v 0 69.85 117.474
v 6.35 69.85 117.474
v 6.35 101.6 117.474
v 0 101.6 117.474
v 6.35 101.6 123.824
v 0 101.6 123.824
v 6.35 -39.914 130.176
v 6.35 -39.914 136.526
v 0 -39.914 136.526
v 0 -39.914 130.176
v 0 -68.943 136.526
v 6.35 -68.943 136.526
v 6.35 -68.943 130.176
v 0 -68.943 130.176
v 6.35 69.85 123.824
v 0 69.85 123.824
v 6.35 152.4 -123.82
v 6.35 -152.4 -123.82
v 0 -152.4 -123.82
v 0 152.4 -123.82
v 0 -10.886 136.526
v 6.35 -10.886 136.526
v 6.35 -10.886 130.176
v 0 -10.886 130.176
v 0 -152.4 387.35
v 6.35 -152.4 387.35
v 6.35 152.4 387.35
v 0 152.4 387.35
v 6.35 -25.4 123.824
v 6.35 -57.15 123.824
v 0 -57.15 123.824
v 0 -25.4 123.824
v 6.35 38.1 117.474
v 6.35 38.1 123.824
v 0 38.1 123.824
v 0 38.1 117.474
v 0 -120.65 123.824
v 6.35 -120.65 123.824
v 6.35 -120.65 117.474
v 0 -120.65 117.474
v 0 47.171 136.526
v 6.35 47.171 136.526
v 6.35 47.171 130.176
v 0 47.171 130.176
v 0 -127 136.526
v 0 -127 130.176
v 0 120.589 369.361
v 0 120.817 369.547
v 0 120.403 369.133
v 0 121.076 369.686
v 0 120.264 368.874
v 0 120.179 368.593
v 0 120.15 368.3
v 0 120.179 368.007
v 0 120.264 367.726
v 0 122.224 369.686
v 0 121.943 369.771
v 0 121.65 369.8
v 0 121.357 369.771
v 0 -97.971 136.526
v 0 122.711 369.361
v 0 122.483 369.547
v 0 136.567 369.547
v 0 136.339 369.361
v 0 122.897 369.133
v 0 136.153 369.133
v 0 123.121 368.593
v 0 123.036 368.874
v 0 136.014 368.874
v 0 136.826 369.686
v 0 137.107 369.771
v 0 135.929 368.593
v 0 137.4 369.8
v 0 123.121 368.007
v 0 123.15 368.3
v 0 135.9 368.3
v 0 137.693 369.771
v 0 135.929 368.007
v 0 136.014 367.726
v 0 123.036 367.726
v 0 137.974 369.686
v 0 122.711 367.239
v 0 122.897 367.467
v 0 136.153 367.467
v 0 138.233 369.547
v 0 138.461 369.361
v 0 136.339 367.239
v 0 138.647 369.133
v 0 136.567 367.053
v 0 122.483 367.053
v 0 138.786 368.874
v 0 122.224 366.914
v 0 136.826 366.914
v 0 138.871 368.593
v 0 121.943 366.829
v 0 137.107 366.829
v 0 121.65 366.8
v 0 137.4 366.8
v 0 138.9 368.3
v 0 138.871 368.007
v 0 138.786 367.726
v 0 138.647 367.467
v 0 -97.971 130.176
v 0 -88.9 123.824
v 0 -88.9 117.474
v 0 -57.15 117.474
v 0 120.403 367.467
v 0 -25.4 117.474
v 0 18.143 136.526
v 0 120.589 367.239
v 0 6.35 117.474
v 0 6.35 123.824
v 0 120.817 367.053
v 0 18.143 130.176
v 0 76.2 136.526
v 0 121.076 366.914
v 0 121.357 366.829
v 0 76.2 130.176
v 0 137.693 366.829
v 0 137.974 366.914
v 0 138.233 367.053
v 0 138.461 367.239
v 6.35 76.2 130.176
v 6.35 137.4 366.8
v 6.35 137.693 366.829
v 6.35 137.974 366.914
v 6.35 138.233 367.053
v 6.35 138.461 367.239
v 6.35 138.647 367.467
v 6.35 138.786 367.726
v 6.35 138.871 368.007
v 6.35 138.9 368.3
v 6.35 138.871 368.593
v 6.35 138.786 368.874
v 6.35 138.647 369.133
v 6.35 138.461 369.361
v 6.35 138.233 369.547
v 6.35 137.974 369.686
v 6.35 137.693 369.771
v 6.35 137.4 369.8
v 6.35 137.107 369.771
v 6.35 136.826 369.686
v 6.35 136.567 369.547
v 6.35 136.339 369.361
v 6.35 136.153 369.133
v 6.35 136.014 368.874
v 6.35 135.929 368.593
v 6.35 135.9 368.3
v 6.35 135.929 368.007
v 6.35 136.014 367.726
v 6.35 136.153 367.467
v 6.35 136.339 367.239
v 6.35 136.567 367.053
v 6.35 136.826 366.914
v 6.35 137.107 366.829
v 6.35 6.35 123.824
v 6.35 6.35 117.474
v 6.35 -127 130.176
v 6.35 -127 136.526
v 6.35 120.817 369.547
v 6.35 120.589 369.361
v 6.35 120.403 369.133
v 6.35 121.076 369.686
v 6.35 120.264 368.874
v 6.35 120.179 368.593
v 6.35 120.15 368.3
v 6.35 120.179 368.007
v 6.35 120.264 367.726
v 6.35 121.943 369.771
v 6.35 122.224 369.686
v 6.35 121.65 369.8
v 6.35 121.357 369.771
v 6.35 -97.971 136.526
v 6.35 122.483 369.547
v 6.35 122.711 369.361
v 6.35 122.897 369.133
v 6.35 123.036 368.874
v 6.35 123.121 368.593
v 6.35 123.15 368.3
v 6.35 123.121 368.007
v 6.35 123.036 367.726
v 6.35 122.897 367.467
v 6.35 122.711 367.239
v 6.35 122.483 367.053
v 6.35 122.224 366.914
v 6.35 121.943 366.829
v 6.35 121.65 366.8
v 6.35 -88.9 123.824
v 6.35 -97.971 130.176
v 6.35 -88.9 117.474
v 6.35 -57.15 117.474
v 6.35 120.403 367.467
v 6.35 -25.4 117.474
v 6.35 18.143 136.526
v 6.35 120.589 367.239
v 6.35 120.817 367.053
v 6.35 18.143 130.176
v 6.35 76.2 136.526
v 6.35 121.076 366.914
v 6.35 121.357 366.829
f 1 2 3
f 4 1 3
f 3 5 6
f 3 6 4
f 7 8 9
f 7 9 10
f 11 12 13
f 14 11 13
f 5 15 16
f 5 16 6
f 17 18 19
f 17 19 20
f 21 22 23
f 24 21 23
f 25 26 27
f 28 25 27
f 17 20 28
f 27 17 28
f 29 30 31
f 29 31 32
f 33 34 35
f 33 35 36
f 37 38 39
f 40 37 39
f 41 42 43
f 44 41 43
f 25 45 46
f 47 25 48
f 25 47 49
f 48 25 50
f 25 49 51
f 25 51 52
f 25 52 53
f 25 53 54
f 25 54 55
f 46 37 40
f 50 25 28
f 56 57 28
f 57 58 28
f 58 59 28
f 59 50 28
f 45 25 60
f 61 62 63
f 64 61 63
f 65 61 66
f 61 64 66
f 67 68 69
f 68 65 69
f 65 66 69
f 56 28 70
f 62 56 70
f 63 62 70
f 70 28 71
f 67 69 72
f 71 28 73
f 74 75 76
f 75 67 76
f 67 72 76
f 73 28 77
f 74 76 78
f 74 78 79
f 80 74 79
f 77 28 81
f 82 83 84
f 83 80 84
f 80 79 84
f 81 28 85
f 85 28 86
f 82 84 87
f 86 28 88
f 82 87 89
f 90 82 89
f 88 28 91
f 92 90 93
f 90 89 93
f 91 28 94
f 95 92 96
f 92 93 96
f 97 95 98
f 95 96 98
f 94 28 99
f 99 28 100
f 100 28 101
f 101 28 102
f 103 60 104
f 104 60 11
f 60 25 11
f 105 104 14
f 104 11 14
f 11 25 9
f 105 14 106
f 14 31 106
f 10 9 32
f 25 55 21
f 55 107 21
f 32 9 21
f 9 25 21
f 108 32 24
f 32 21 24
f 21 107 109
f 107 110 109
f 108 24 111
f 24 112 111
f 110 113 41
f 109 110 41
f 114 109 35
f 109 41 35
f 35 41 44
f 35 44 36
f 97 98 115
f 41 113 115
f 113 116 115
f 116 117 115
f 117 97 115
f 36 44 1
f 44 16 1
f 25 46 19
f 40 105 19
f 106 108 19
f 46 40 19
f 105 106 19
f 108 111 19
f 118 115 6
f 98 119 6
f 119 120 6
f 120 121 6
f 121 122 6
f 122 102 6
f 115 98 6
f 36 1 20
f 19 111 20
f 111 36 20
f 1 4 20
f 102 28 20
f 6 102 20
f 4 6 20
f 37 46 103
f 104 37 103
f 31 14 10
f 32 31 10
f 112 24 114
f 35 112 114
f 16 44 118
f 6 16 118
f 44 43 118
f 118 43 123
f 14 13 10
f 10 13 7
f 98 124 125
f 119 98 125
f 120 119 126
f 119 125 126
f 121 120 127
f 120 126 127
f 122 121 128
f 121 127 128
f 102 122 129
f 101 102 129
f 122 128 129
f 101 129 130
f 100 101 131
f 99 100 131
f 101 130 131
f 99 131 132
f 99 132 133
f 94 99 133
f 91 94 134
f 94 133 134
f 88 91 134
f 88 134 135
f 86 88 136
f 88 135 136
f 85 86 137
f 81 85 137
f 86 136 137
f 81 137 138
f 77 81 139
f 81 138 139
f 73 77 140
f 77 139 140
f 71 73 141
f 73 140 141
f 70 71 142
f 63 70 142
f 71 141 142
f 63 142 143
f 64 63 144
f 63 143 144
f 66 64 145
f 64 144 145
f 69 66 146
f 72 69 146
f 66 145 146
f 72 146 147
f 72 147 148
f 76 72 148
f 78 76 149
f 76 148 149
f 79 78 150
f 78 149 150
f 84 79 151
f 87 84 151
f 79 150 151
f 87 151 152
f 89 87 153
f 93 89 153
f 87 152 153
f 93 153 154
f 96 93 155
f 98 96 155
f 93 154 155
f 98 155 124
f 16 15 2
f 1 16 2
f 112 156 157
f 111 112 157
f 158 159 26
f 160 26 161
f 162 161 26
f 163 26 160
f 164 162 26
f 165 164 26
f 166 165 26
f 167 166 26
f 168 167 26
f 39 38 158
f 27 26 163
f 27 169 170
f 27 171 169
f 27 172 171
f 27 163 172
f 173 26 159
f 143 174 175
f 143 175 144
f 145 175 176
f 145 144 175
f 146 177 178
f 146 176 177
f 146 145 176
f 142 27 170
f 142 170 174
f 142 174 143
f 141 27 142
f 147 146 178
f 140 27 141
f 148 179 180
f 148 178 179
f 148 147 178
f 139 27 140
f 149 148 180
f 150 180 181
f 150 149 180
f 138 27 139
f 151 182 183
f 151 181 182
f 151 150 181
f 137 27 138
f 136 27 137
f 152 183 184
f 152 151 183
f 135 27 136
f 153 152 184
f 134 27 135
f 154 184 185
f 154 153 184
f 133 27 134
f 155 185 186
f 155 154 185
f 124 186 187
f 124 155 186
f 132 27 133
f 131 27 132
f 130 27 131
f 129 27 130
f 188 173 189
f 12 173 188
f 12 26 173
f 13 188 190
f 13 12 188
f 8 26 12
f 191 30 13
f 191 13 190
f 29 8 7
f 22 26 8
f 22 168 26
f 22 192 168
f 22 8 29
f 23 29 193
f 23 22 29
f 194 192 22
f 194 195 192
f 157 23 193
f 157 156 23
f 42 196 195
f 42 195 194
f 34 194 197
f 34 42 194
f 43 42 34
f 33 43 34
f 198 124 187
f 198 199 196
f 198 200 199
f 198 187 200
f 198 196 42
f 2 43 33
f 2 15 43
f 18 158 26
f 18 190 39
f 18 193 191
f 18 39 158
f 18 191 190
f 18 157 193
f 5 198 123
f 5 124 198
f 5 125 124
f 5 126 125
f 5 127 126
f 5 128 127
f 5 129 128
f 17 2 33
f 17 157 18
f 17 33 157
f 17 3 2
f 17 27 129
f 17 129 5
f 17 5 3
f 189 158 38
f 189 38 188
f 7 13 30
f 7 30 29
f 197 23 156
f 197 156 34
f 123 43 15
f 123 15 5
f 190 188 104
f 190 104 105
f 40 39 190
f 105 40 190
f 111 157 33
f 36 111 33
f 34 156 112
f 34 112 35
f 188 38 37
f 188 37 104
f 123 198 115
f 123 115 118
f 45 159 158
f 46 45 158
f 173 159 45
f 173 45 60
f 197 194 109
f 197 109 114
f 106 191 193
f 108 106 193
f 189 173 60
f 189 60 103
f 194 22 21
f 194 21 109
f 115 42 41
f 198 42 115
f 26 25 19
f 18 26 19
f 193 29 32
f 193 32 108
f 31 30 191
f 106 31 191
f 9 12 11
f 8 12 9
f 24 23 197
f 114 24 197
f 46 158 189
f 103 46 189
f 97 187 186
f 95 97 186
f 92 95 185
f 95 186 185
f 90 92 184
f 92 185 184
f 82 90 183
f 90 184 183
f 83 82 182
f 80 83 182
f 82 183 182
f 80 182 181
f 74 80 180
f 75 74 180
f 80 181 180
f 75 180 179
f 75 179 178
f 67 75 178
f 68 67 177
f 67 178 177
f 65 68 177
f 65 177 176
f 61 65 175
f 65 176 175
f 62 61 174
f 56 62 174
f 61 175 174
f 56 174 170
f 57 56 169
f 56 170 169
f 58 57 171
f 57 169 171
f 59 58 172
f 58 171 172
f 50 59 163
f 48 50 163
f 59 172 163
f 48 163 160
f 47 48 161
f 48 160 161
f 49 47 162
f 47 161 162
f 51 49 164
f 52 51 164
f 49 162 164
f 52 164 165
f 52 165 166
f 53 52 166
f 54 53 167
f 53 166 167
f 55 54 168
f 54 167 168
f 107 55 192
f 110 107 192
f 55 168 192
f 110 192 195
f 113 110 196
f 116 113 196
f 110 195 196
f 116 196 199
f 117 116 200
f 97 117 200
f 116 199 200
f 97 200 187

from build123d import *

# Parameters (mm, degrees)
BOSS_EXTRUDE1_DEPTH = 6.35
SKETCH3_W           = 6.35
SKETCH3_H           = 29.028571429
SKETCH3_H_2         = 31.75
CUT_EXTRUDE1_DEPTH  = 419.66682159
SKETCH4_R           = 1.5
CUT_EXTRUDE2_DEPTH  = 6.35
SKETCH5_W           = 6.35
SKETCH5_H           = 44.45
SKETCH5_W_2         = 59.592307692
SKETCH5_H_2         = 6.35
CUT_EXTRUDE3_DEPTH  = 6.35
SKETCH6_W           = 6.35
SKETCH6_H           = 222.25
BOSS_EXTRUDE2_DEPTH = 6.35
SKETCH7_W           = 774.7
SKETCH7_H           = 14.696452311
CUT_EXTRUDE4_DEPTH  = 6.35
SKETCH8_W           = 263.53
SKETCH8_H           = 304.8
CUT_EXTRUDE5_DEPTH  = 417.300498438


with BuildPart() as part:
    # Sketch1 → Boss-Extrude1 (new body)
    with BuildSketch(Plane(origin=(0, 0, 0), x_dir=(0, 0, -1), z_dir=(1, 0, 0))):
        Polygon((381, 152.4), (-387.35, 152.4), (-387.35, 107.95), (-381, 107.95), (-381, 63.5), (-387.35, 63.5), (-387.35, 19.05), (-381, 19.05), (-381, -25.4), (-387.35, -25.4), (-387.35, -69.85), (-381, -69.85), (-381, -114.3), (-387.35, -114.3), (-387.35, -152.4), (-327.757692308, -152.4), (-327.757692308, -158.75), (-268.165384615, -158.75), (-268.165384615, -152.4), (-208.573076923, -152.4), (-208.573076923, -158.75), (-148.980769231, -158.75), (-148.980769231, -152.4), (-89.388461538, -152.4), (-89.388461538, -158.75), (-29.796153846, -158.75), (-29.796153846, -152.4), (29.796153846, -152.4), (29.796153846, -158.75), (89.388461538, -158.75), (89.388461538, -152.4), (148.980769231, -152.4), (148.980769231, -158.75), (208.573076923, -158.75), (208.573076923, -152.4), (268.165384615, -152.4), (268.165384615, -158.75), (327.757692308, -158.75), (327.757692308, -152.4), (387.35, -152.4), (387.35, -114.3), (381, -114.3), (381, -69.85), (387.35, -69.85), (387.35, -25.4), (381, -25.4), (381, 19.05), (387.35, 19.05), (387.35, 63.5), (381, 63.5), (381, 107.95), (387.35, 107.95), (387.35, 152.4), align=None)
    extrude(amount=BOSS_EXTRUDE1_DEPTH)

    # Sketch3 → Cut-Extrude1 (cut, through all)
    with BuildSketch(Plane(origin=(6.35, 0, 0), x_dir=(0, 0, -1), z_dir=(1, 0, 0))):
        with Locations((-133.351230315, 61.685714285)):
            Rectangle(SKETCH3_W, SKETCH3_H)
        with Locations((-120.648769685, 85.725)):
            Rectangle(SKETCH3_W, SKETCH3_H_2)
        with Locations((-120.648769685, 22.225)):
            Rectangle(SKETCH3_W, SKETCH3_H_2)
        with Locations((-120.648769685, -41.275)):
            Rectangle(SKETCH3_W, SKETCH3_H_2)
        with Locations((-120.648769685, -104.775)):
            Rectangle(SKETCH3_W, SKETCH3_H_2)
        with Locations((-133.351230315, 3.628571428)):
            Rectangle(SKETCH3_W, SKETCH3_H)
        with Locations((-133.351230315, -54.428571428)):
            Rectangle(SKETCH3_W, SKETCH3_H)
        with Locations((-133.351230315, -112.485714286)):
            Rectangle(SKETCH3_W, SKETCH3_H)
    extrude(amount=-CUT_EXTRUDE1_DEPTH, mode=Mode.SUBTRACT)

    # Sketch4 → Cut-Extrude2 (cut)
    with BuildSketch(Plane(origin=(6.35, 0, 0), x_dir=(0, 0, -1), z_dir=(1, 0, 0))):
        with Locations((-368.3, 137.4)):
            Circle(SKETCH4_R)
        with Locations((-368.3, 121.65)):
            Circle(SKETCH4_R)
        with Locations((368.3, 137.4)):
            Circle(SKETCH4_R)
        with Locations((368.3, 121.65)):
            Circle(SKETCH4_R)
    extrude(amount=-CUT_EXTRUDE2_DEPTH, mode=Mode.SUBTRACT)

    # Sketch5 → Cut-Extrude3 (cut)
    with BuildSketch(Plane(origin=(6.35, 0, 0), x_dir=(0, 0, -1), z_dir=(1, 0, 0))):
        with Locations((-384.175, 41.275)):
            Rectangle(SKETCH5_W, SKETCH5_H)
        with Locations((-384.175, -47.625)):
            Rectangle(SKETCH5_W, SKETCH5_H)
        with Locations((-178.776923077, -155.575)):
            Rectangle(SKETCH5_W_2, SKETCH5_H_2)
        with Locations((-59.592307692, -155.575)):
            Rectangle(SKETCH5_W_2, SKETCH5_H_2)
        with Locations((59.592307692, -155.575)):
            Rectangle(SKETCH5_W_2, SKETCH5_H_2)
        with Locations((178.776923077, -155.575)):
            Rectangle(SKETCH5_W_2, SKETCH5_H_2)
        with Locations((384.175, -47.625)):
            Rectangle(SKETCH5_W, SKETCH5_H)
        with Locations((384.175, 41.275)):
            Rectangle(SKETCH5_W, SKETCH5_H)
    extrude(amount=-CUT_EXTRUDE3_DEPTH, mode=Mode.SUBTRACT)

    # Sketch6 → Boss-Extrude2 (add)
    with BuildSketch(Plane(origin=(6.35, 0, 0), x_dir=(0, 0, -1), z_dir=(1, 0, 0))):
        with Locations((-384.175, -3.175)):
            Rectangle(SKETCH6_W, SKETCH6_H)
        with Locations((384.175, -3.175)):
            Rectangle(SKETCH6_W, SKETCH6_H)
    extrude(amount=-BOSS_EXTRUDE2_DEPTH)

    # Sketch7 → Cut-Extrude4 (cut)
    with BuildSketch(Plane(origin=(6.35, 0, 0), x_dir=(0, 0, -1), z_dir=(1, 0, 0))):
        with Locations((0, -159.748226155)):
            Rectangle(SKETCH7_W, SKETCH7_H)
    extrude(amount=-CUT_EXTRUDE4_DEPTH, mode=Mode.SUBTRACT)

    # Sketch8 → Cut-Extrude5 (cut, through all)
    with BuildSketch(Plane(origin=(6.35, 0, 0), x_dir=(0, 0, -1), z_dir=(1, 0, 0))):
        with Locations((255.585, 0)):
            Rectangle(SKETCH8_W, SKETCH8_H)
    extrude(amount=-CUT_EXTRUDE5_DEPTH, mode=Mode.SUBTRACT)


solid = part.part
